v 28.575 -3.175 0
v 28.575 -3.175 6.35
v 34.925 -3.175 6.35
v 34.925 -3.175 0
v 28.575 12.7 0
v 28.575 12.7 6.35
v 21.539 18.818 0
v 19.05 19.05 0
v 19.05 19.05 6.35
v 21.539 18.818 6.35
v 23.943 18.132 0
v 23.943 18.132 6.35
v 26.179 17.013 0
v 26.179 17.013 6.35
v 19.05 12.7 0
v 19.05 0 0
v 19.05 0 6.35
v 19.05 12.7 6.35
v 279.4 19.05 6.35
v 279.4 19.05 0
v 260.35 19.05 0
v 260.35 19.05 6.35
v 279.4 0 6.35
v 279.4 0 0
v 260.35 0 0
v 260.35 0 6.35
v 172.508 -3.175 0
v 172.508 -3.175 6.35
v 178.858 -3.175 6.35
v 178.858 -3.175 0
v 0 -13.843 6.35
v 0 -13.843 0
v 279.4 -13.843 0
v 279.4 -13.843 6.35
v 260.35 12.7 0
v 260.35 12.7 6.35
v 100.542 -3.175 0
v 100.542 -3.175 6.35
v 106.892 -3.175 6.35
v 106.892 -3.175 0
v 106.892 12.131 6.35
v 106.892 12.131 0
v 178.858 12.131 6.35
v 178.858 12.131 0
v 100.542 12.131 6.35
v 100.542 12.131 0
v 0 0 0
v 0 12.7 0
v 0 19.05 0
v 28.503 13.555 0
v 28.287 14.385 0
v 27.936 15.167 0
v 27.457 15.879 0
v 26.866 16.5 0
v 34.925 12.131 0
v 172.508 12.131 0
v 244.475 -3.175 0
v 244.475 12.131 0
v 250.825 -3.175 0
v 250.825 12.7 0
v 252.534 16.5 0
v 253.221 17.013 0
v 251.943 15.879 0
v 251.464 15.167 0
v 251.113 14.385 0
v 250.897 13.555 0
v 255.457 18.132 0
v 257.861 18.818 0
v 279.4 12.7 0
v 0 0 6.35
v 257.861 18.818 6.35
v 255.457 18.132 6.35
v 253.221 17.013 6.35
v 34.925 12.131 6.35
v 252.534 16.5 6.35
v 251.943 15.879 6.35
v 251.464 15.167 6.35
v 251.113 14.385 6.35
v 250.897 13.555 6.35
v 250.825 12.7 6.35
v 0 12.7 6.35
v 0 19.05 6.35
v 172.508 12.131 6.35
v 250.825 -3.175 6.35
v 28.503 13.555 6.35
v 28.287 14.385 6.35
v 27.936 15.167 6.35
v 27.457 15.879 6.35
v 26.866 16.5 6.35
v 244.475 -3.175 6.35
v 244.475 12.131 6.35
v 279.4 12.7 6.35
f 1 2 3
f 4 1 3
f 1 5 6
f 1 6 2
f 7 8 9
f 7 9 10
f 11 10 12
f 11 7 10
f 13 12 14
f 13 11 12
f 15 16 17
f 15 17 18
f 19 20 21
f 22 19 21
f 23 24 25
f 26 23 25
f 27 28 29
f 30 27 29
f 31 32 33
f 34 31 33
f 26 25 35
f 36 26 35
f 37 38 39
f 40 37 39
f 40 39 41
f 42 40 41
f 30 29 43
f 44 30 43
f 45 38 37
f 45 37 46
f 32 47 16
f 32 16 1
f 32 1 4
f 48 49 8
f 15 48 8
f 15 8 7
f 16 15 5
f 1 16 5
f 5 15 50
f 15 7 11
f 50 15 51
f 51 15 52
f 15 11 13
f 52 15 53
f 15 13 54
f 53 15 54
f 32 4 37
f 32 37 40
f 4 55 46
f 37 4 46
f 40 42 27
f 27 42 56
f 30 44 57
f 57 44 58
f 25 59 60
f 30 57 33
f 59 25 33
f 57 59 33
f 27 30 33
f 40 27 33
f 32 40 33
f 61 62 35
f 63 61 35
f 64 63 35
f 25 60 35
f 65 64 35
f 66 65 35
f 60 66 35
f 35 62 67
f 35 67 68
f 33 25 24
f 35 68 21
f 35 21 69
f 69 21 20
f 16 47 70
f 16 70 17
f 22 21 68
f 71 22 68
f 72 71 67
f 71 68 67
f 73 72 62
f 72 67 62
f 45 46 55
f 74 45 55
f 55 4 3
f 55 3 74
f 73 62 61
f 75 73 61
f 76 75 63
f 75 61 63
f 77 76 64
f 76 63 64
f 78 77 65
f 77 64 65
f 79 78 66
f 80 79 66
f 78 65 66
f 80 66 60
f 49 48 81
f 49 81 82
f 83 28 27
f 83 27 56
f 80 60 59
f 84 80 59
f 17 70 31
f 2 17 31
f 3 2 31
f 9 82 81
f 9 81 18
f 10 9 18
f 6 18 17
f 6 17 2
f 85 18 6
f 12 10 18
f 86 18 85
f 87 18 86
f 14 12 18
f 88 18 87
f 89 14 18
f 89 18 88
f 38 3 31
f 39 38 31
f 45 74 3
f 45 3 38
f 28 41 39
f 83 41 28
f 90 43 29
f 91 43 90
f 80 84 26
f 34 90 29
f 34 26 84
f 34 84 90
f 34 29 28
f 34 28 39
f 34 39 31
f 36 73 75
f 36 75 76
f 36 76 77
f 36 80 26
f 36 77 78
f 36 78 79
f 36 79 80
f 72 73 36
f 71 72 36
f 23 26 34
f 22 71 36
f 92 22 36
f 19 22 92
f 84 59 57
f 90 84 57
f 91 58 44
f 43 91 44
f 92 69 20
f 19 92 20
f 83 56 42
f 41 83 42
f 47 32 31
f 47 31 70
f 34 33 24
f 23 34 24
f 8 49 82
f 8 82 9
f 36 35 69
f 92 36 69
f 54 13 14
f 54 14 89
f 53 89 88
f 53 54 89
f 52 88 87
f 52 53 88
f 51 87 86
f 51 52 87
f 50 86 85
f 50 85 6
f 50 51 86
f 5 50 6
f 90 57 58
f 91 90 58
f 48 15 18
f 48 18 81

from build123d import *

# Parameters (mm, degrees)
BOSS_EXTRUDE1_DEPTH = 6.35
SKETCH2_W           = 6.35
SKETCH2_H           = 15.306086647
CUT_EXTRUDE1_DEPTH  = 281.120661501


with BuildPart() as part:
    # Sketch1 → Boss-Extrude1 (new body)
    with BuildSketch(Plane.XY):
        with BuildLine():
            Line((0, 0), (19.05, 0))
            Line((19.05, 0), (19.05, 12.7))
            Line((19.05, 12.7), (0, 12.7))
            Line((0, 12.7), (0, 19.05))
            Line((0, 19.05), (19.05, 19.05))
            ThreePointArc((19.05, 19.05), (22.75701822, 18.530813768), (26.178773585, 17.013207547))
            ThreePointArc((26.178773585, 17.013207547), (27.935718963, 15.16706609), (28.575, 12.7))
            Line((28.575, 12.7), (28.575, 0))
            Line((28.575, 0), (28.575, -3.175))
            Line((28.575, -3.175), (34.925, -3.175))
            Line((34.925, -3.175), (34.925, 12.131086647))
            Line((34.925, 12.131086647), (139.7, 12.131086647))
            Line((139.7, 12.131086647), (139.7, -13.843))
            Line((139.7, -13.843), (0, -13.843))
            Line((0, -13.843), (0, 0))
        make_face()
    boss_extrude1 = extrude(amount=BOSS_EXTRUDE1_DEPTH)

    # Mirror1: Boss-Extrude1 across plane
    add(boss_extrude1.mirror(Plane(origin=(139.7, 12.131086647, 6.35), x_dir=(0, 0, 1), z_dir=(-1, 0, 0))))

    # Sketch2 → Cut-Extrude1 (cut, through all)
    with BuildSketch(Plane.XY.offset(6.35)):
        with Locations((103.716666667, 4.478043323)):
            Rectangle(SKETCH2_W, SKETCH2_H)
        with Locations((175.683333333, 4.478043323)):
            Rectangle(SKETCH2_W, SKETCH2_H)
    extrude(amount=-CUT_EXTRUDE1_DEPTH, mode=Mode.SUBTRACT)


solid = part.part
